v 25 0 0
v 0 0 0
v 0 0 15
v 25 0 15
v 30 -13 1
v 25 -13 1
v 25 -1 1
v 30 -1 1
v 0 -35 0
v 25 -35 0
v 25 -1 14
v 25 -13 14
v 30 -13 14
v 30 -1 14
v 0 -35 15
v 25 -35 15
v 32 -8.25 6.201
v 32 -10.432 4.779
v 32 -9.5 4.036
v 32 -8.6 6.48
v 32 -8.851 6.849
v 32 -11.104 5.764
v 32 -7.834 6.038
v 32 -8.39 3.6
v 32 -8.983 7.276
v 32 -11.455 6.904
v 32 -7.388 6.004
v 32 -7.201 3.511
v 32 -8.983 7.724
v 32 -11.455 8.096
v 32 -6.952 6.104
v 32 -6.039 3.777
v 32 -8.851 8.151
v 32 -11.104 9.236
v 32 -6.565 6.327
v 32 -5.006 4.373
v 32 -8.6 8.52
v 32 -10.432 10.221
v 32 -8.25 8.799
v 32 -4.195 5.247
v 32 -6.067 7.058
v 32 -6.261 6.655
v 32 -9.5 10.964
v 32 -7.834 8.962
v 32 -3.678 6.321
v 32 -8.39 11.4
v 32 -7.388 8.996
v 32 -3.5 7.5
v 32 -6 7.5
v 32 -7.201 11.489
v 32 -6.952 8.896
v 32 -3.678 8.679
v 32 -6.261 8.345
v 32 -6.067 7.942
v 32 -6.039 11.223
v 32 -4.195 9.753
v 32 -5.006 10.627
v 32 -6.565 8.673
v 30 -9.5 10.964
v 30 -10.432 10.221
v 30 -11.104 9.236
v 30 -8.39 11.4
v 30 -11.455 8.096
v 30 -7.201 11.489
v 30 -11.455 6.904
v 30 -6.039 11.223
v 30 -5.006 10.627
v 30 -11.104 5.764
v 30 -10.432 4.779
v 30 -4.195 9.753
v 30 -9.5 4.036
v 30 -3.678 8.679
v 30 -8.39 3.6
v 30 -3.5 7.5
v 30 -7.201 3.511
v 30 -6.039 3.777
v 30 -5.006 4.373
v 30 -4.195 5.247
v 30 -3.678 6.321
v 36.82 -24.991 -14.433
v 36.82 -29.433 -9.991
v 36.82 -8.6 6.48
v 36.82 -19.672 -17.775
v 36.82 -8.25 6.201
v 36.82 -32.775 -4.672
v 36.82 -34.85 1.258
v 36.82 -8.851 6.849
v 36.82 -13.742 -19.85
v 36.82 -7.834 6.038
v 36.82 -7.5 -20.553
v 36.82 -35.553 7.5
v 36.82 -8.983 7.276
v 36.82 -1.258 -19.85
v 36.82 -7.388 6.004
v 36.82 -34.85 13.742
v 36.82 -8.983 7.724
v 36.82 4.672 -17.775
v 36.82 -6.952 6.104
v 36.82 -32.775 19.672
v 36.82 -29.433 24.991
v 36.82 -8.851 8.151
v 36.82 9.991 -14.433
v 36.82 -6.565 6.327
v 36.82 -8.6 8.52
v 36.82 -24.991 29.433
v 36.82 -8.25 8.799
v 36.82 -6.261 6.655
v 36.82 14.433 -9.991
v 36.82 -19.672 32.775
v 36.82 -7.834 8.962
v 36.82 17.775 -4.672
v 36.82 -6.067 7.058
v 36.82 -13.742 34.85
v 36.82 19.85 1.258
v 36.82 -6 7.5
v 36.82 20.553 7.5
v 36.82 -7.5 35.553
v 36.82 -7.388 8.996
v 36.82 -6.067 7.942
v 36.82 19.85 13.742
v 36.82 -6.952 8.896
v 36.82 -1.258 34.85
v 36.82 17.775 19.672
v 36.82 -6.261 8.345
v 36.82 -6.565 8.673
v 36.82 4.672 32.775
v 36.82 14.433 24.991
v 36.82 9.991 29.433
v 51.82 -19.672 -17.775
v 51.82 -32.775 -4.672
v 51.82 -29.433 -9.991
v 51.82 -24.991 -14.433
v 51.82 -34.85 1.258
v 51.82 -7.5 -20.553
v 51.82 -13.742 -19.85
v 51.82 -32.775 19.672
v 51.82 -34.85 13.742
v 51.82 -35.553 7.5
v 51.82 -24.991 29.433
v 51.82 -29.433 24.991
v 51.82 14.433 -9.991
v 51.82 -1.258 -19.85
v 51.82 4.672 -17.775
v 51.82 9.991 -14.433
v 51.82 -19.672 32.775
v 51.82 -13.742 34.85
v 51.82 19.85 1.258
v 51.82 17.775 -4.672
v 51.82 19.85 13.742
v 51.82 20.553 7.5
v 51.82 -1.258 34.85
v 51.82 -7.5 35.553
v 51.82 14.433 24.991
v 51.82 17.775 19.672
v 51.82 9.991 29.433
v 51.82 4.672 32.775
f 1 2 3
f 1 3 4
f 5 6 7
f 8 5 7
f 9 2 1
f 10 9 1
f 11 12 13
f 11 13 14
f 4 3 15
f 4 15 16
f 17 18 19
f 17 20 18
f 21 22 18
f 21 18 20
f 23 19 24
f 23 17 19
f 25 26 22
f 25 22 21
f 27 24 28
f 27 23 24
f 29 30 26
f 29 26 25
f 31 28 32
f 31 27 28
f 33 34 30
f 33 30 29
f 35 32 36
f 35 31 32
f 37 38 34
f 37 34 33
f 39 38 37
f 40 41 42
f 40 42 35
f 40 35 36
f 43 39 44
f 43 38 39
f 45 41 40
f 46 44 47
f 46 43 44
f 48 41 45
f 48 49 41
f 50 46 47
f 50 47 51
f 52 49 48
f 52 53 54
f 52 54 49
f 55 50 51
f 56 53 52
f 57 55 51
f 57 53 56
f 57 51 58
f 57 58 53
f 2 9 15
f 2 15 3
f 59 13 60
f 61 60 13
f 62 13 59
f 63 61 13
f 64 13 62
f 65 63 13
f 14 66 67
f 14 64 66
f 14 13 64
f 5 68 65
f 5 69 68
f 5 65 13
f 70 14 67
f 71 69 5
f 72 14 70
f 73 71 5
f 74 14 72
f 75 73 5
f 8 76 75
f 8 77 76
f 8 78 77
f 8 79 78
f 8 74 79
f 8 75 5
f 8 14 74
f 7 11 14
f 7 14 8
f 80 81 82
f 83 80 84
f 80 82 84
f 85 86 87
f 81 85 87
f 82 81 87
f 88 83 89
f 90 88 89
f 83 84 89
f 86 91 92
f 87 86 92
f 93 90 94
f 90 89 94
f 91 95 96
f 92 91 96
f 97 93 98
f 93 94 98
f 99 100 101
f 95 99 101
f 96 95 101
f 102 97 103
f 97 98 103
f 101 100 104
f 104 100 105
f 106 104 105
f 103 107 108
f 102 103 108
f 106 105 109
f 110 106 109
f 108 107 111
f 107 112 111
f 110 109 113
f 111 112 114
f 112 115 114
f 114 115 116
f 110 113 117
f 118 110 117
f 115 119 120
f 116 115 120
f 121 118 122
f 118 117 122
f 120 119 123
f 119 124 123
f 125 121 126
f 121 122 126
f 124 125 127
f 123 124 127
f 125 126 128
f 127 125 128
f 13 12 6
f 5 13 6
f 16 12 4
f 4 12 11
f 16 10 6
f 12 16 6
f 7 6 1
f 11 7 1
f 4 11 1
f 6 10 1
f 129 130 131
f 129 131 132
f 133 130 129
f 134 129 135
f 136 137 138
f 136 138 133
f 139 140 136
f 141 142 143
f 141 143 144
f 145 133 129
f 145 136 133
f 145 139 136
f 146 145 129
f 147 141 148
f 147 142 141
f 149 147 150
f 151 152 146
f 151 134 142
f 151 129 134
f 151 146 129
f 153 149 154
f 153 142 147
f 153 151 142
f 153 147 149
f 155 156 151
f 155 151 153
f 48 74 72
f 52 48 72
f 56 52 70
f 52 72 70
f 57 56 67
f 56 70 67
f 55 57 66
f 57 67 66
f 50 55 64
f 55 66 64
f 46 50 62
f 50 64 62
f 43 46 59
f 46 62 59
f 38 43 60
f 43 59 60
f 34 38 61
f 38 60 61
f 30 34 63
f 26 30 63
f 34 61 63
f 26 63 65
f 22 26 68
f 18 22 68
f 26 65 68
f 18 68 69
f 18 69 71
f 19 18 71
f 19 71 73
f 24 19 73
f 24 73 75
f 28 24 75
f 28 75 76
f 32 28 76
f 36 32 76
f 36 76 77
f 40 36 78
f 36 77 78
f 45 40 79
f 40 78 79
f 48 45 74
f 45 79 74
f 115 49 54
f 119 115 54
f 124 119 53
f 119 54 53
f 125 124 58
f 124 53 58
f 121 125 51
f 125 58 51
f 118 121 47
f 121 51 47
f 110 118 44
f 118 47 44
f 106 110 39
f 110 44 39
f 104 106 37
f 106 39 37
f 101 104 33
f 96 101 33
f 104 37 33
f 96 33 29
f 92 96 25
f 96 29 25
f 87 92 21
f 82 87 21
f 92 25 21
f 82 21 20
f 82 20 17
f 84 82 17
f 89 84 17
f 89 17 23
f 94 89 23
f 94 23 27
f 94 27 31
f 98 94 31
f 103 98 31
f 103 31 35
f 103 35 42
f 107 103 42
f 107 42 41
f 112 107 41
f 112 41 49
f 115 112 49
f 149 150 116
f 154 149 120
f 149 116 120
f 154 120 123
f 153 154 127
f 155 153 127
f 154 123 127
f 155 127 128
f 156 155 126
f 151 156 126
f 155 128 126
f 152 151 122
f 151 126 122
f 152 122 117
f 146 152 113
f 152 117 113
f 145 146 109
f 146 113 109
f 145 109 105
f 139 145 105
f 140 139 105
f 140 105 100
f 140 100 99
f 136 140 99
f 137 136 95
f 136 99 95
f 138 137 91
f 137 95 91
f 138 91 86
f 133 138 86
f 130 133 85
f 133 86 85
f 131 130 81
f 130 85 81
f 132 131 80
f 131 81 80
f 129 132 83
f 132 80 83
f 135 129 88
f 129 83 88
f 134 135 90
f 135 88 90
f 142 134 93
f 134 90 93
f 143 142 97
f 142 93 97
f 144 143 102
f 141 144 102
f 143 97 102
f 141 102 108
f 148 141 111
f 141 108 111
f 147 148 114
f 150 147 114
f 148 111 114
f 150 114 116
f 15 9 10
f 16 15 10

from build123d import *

# Parameters (mm, degrees)
SKETCH_1_W           = 25
SKETCH_1_H           = 35
EXTRUDE_1_DEPTH      = 15
SKETCH_3_W           = 13
SKETCH_3_H           = 12
EXTRUDE_2_DEPTH      = 5
EXTRUDE_START        = 30
SKETCH_4_R           = 4
EXTRUDE_3_DEPTH      = 2
EXTRUDE_4_DEPTH      = 4.819582841
EXTRUDE_4_DEPTH_BACK = 2
EXTRUDE_4_START      = 32
SKETCH_5_R           = 1.5
EXTRUDE_START_2      = 36.819583
SKETCH_6_R           = 28.053339705
EXTRUDE_5_DEPTH      = 15


with BuildPart() as part:
    # 草图1 → 凸台-拉伸1 (new body)
    with BuildSketch(Plane.XY):
        with Locations((12.5, -17.5)):
            Rectangle(SKETCH_1_W, SKETCH_1_H)
    extrude(amount=EXTRUDE_1_DEPTH)

    # 草图3 → 凸台-拉伸2 (add)
    with BuildSketch(Plane(origin=(25, 0, 0), x_dir=(0, 0, -1), z_dir=(1, 0, 0))):
        with Locations((-7.5, -7)):
            Rectangle(SKETCH_3_W, SKETCH_3_H)
    extrude(amount=EXTRUDE_2_DEPTH)

    # 草图4 → 凸台-拉伸3 (add)
    with BuildSketch(Plane(origin=(0, 0, 0), x_dir=(0, 0, -1), z_dir=(1, 0, 0)).offset(EXTRUDE_START)):
        with Locations(Location((-7.5, -7.5, 0), (0, 0, 90))):
            Circle(SKETCH_4_R)
    extrude(amount=EXTRUDE_3_DEPTH)

    # 草图5 → 凸台-拉伸4 (add, two sides: drawn at the far end of the back side and taken through both)
    with BuildSketch(Plane(origin=(0, 0, 0), x_dir=(0, 0, -1), z_dir=(1, 0, 0)).offset(EXTRUDE_4_START - EXTRUDE_4_DEPTH_BACK)):
        with Locations(Location((-7.5, -7.5, 0), (0, 0, 90))):
            Circle(SKETCH_5_R)
    extrude(amount=EXTRUDE_4_DEPTH + EXTRUDE_4_DEPTH_BACK)

    # 草图6 → 凸台-拉伸5 (add)
    with BuildSketch(Plane(origin=(0, 0, 0), x_dir=(0, 0, -1), z_dir=(1, 0, 0)).offset(EXTRUDE_START_2)):
        with Locations(Location((-7.5, -7.5, 0), (0, 0, 90))):
            Circle(SKETCH_6_R)
    extrude(amount=EXTRUDE_5_DEPTH)


solid = part.part
